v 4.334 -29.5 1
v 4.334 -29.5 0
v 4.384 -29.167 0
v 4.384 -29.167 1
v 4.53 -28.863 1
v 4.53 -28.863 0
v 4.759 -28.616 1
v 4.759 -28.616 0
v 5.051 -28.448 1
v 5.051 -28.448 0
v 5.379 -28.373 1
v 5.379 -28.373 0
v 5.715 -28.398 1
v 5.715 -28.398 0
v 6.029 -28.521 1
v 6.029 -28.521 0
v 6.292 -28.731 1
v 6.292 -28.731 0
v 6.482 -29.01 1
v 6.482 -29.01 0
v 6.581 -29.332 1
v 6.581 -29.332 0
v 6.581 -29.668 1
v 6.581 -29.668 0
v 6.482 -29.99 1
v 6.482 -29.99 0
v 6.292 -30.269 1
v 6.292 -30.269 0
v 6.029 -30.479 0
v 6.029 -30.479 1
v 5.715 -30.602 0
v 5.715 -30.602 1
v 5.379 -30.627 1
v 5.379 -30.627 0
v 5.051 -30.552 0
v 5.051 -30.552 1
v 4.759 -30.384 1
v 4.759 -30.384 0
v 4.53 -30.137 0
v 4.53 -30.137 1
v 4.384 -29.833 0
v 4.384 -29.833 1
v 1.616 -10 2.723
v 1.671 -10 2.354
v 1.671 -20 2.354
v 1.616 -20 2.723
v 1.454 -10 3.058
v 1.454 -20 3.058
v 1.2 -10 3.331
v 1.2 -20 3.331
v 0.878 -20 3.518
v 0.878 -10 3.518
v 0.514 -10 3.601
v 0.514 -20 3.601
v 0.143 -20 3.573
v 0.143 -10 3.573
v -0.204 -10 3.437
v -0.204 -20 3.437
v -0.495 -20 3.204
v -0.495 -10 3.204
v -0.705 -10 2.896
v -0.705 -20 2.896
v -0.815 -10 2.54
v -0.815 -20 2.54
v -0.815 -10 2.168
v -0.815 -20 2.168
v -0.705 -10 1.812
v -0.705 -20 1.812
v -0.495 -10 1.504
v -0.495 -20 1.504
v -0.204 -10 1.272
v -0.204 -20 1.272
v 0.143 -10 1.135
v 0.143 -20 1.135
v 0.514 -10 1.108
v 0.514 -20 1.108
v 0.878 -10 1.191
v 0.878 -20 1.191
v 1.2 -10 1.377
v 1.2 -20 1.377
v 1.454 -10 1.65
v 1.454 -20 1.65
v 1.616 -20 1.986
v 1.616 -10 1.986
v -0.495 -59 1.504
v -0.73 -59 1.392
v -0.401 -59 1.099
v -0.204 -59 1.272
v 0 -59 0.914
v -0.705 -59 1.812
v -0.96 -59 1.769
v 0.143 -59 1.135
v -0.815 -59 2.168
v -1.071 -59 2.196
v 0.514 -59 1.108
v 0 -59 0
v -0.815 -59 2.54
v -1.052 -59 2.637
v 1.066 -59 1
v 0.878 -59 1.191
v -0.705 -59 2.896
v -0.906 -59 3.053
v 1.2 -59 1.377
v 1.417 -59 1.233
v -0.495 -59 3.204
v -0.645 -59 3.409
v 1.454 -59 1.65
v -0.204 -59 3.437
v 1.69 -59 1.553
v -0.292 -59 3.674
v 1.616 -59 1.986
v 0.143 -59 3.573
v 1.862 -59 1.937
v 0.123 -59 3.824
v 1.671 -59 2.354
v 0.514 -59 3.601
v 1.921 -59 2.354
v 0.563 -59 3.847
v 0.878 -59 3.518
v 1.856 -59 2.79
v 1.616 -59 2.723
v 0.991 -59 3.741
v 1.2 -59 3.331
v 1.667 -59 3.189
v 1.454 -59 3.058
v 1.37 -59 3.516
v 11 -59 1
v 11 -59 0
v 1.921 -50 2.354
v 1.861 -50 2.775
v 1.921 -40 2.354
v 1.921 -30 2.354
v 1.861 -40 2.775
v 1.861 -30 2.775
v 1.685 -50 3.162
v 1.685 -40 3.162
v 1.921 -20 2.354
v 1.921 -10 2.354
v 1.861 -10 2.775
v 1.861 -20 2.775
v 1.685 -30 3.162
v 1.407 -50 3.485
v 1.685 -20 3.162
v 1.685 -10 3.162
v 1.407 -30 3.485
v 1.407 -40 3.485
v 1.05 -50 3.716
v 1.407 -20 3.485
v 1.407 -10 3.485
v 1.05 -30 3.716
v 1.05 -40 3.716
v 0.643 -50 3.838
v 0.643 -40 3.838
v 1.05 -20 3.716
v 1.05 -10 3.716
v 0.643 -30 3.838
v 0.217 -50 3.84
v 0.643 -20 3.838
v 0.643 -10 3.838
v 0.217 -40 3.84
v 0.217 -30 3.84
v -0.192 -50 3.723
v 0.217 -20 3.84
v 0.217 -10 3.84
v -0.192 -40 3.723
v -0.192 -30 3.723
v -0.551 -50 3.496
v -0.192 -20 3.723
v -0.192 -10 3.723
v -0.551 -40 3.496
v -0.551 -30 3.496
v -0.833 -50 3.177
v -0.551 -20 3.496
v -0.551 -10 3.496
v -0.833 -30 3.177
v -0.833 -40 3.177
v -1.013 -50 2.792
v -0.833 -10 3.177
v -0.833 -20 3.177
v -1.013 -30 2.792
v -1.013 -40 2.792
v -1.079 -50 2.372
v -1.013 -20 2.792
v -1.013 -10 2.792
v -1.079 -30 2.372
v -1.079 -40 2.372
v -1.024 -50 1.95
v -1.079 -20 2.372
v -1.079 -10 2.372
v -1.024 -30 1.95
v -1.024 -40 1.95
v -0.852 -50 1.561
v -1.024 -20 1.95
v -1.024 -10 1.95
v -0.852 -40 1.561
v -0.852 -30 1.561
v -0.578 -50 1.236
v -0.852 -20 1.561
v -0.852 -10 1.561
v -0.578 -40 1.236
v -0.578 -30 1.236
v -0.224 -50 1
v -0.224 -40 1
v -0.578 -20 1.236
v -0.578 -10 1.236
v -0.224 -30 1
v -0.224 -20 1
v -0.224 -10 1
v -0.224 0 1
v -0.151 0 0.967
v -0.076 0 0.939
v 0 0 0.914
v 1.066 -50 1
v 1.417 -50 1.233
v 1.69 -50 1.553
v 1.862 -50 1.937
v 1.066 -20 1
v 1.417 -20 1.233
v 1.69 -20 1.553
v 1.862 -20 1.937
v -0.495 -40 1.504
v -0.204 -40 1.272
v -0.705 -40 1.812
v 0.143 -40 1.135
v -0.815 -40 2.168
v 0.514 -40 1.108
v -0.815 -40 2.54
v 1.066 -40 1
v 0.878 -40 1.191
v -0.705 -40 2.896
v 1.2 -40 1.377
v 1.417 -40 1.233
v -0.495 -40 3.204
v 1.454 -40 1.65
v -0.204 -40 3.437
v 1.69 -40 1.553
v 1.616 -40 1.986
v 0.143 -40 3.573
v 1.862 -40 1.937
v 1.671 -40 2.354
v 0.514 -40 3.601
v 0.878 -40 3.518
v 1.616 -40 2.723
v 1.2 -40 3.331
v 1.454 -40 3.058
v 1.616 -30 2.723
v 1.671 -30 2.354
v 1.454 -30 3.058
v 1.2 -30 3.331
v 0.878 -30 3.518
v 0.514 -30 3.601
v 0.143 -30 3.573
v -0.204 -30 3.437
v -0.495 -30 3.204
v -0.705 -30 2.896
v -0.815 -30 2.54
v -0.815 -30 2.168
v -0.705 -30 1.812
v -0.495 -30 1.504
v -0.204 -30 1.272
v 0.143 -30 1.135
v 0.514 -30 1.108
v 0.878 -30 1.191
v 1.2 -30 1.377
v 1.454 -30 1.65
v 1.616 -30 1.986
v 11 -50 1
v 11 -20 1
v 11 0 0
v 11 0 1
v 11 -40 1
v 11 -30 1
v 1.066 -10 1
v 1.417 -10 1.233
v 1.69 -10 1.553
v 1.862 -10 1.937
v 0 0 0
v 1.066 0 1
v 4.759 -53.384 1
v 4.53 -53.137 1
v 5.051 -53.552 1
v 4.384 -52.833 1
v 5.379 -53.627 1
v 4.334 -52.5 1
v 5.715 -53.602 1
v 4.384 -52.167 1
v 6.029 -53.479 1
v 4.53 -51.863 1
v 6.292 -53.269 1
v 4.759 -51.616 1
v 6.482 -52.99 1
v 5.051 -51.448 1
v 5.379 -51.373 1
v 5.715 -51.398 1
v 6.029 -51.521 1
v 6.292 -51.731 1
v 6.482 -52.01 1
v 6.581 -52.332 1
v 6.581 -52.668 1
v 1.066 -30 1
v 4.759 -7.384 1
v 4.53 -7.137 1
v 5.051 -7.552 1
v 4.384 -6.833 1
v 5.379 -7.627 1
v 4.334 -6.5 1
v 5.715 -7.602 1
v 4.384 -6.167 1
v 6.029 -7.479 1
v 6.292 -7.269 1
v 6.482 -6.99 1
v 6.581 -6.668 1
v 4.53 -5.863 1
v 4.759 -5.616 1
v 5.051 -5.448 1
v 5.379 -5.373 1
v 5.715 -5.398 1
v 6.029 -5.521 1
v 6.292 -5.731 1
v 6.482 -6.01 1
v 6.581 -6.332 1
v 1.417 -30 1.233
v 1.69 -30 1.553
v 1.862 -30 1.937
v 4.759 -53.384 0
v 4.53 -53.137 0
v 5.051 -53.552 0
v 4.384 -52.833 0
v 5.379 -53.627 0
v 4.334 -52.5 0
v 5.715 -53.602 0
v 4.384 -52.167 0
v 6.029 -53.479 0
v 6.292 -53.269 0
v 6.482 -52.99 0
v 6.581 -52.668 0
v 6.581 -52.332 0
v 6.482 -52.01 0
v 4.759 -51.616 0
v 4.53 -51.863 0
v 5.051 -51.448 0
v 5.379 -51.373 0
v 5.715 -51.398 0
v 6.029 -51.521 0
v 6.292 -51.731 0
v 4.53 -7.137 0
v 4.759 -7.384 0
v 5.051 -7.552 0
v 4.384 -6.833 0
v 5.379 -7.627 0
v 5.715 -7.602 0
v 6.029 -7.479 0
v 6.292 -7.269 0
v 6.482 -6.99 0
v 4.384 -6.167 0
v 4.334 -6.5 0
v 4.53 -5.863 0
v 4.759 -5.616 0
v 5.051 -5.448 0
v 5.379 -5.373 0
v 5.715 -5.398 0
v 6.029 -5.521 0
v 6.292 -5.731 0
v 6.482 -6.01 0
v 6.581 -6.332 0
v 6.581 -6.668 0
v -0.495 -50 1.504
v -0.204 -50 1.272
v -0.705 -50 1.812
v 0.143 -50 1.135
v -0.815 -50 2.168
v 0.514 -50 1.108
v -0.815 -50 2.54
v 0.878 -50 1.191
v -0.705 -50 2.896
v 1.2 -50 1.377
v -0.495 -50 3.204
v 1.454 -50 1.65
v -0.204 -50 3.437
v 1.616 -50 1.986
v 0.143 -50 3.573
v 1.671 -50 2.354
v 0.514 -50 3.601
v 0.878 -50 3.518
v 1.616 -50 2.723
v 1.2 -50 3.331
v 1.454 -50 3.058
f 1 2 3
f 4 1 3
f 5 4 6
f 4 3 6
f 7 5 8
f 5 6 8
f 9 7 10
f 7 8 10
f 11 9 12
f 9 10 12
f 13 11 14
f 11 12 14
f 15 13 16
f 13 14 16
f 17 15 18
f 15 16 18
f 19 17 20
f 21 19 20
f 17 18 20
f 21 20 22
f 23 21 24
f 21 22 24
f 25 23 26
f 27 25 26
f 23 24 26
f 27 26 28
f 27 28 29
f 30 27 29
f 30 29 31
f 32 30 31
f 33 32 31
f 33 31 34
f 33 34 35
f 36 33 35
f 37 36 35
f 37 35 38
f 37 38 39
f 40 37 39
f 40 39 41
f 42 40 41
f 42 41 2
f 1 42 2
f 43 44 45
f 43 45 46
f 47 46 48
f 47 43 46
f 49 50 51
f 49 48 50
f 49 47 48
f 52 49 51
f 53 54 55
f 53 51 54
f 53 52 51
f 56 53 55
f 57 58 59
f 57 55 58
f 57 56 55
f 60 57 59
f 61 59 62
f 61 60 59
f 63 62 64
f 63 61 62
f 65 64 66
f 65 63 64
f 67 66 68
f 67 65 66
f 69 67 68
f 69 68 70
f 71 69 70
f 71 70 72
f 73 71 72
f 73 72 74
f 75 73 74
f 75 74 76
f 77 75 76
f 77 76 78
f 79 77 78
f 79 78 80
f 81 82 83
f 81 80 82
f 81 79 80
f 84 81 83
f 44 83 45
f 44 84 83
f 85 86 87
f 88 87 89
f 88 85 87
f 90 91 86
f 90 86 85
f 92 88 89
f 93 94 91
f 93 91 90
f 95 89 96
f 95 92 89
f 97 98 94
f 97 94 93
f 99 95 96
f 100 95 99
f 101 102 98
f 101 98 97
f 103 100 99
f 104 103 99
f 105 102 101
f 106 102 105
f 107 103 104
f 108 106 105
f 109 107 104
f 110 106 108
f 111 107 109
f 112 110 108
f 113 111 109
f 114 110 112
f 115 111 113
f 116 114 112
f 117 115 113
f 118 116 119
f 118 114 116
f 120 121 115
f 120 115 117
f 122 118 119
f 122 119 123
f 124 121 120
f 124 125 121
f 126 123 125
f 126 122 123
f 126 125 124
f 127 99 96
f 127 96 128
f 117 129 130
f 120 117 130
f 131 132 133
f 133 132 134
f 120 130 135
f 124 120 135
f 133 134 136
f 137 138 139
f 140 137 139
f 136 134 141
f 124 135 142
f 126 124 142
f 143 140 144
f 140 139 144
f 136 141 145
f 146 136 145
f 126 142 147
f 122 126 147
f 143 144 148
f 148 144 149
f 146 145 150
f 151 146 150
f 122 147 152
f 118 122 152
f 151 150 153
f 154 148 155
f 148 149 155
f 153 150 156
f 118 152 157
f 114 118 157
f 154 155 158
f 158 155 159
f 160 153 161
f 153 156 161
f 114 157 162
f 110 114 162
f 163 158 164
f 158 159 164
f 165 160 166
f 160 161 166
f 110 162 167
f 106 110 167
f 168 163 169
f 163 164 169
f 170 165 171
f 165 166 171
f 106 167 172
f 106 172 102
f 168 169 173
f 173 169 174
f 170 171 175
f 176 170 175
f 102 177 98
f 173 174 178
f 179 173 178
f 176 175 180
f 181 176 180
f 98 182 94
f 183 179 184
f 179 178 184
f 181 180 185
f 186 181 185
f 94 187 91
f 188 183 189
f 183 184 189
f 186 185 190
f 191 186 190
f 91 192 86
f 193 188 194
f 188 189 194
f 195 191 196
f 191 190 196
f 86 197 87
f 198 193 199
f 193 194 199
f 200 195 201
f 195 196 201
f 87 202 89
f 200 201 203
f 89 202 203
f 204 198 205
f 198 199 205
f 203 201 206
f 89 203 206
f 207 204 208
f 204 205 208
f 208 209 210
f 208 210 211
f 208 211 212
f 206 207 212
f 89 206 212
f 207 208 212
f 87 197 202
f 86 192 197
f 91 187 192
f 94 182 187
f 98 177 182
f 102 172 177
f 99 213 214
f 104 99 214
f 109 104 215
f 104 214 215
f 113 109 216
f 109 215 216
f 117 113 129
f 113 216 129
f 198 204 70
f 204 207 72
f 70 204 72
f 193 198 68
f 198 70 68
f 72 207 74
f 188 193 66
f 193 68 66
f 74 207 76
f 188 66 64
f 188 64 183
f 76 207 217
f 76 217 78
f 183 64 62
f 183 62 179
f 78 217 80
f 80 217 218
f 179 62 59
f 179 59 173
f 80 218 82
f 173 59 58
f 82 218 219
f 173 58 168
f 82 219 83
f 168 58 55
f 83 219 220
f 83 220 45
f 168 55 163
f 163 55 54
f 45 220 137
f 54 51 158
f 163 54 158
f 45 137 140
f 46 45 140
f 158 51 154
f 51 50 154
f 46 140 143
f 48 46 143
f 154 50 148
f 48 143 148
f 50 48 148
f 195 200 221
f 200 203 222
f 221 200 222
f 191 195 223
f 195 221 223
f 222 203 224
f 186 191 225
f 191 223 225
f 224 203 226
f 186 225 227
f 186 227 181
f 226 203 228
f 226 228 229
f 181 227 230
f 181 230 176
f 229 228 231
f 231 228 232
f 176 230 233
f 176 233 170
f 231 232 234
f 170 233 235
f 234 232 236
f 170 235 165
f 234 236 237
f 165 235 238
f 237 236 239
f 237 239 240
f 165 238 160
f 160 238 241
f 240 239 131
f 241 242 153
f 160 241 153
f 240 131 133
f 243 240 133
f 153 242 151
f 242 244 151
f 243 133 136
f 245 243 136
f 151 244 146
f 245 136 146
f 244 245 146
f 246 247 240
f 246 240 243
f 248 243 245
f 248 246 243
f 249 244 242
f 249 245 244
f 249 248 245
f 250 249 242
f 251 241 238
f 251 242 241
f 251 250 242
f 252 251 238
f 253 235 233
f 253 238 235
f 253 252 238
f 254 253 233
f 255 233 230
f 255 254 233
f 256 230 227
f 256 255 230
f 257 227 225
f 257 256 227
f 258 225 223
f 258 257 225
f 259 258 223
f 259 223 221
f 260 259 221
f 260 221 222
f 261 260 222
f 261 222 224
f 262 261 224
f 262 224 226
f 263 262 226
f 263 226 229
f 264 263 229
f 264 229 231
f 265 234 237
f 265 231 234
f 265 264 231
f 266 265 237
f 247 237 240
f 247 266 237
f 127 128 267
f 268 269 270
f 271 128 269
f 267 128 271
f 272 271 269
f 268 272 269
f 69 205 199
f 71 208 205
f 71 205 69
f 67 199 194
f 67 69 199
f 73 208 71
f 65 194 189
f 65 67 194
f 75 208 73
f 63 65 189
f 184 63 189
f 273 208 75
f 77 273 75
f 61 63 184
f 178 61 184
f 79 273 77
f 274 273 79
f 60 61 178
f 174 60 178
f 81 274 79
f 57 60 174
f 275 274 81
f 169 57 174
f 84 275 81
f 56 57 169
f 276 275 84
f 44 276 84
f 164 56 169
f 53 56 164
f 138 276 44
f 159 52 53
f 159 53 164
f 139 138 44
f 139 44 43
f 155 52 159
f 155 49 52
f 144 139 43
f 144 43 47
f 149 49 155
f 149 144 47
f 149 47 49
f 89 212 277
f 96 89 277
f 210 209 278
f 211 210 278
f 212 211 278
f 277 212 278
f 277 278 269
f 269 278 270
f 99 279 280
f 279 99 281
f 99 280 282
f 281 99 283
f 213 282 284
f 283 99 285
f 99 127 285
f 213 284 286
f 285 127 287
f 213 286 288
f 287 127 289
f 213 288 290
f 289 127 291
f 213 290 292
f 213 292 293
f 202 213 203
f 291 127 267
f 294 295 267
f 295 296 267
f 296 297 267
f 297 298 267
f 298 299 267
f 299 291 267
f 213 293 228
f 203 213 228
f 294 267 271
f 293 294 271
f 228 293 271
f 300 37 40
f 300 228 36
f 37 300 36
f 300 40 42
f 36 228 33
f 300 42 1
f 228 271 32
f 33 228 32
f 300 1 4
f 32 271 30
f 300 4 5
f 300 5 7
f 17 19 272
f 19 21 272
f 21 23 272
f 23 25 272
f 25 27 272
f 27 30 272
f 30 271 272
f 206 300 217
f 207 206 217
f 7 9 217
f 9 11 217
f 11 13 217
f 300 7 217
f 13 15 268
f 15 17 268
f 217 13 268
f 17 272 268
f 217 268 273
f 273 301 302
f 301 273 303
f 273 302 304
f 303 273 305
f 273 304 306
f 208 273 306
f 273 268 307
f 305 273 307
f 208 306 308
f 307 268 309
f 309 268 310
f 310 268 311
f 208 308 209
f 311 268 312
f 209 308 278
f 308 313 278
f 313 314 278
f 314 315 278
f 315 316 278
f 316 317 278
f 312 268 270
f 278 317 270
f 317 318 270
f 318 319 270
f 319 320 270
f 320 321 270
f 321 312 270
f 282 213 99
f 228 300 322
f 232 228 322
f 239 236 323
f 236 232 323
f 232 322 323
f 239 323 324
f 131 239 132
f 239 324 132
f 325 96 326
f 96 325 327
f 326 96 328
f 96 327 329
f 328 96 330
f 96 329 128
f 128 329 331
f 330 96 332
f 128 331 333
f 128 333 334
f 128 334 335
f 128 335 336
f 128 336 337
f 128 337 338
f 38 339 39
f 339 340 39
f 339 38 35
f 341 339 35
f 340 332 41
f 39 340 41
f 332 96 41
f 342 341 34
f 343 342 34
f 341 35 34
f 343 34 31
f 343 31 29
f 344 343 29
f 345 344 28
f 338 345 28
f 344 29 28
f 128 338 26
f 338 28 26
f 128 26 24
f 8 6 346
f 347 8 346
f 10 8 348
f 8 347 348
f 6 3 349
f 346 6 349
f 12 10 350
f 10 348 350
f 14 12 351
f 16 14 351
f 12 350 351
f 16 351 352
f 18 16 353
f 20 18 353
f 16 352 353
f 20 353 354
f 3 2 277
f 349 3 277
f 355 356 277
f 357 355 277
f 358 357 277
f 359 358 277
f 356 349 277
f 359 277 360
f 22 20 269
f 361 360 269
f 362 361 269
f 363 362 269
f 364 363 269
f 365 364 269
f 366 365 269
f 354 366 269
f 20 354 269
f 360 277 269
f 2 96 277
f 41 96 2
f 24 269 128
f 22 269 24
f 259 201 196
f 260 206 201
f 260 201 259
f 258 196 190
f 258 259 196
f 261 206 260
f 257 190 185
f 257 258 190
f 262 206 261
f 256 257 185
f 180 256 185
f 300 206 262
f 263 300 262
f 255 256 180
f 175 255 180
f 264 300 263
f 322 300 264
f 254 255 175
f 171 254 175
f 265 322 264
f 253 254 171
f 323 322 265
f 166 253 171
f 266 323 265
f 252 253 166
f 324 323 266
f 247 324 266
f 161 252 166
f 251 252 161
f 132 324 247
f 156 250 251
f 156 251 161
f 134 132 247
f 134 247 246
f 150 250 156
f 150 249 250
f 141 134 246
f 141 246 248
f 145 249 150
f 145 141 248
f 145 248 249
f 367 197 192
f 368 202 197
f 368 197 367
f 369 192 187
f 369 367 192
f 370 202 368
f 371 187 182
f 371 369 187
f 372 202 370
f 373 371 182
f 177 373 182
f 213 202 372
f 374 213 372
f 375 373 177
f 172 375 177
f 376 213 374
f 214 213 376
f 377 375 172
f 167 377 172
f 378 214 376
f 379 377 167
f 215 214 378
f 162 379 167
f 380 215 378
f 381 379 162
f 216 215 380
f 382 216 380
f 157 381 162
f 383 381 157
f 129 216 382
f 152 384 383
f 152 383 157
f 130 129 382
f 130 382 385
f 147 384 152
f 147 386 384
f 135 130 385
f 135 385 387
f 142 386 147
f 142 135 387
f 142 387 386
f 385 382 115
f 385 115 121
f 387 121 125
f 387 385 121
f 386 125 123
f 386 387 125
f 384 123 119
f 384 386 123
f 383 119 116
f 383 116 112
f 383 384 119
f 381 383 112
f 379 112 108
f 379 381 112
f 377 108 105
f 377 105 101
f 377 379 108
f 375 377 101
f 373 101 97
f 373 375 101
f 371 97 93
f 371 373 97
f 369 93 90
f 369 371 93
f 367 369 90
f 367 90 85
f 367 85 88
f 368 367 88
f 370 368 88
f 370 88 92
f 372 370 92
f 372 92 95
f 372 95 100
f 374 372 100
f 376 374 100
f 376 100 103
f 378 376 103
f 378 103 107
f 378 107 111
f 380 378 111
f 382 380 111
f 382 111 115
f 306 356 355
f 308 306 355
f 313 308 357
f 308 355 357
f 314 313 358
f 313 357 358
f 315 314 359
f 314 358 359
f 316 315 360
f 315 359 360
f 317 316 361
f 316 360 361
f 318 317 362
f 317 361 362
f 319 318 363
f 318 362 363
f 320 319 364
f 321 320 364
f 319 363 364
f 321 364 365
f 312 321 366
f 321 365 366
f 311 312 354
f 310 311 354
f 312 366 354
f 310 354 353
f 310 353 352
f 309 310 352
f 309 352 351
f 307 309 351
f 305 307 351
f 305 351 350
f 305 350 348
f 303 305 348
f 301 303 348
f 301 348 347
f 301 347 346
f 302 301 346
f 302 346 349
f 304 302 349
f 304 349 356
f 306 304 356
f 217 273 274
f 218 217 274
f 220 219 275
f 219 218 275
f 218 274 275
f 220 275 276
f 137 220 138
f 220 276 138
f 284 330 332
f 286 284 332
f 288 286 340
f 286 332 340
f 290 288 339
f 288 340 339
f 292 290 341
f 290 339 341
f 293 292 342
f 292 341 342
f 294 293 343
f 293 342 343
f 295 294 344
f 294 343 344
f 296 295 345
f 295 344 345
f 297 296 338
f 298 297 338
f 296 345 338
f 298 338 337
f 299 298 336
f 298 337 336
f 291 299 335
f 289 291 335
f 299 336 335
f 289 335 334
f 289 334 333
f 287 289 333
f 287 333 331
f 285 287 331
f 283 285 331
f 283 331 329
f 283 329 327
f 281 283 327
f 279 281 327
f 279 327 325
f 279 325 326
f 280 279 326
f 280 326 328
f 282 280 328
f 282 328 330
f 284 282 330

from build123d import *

# Parameters (mm, degrees)
F0_R     = 1.25
F1_DEPTH = 59
F2_W     = 10
F2_H     = 7.0094654113
F2_H_2   = 7.1141358241
F3_DEPTH = 12.0799340399
F5_D     = 2.2606


with BuildPart() as f1:
    # F0 (on Front) → F1 (new body)
    with BuildSketch(Plane.XZ):
        with BuildLine():
            Line((0, 0.9144042292), (0, 0))
            Line((0, 0), (11, 0))
            Line((11, 0), (11, 1))
            Line((11, 1), (1.0663817193, 1))
            ThreePointArc((1.0663817193, 1), (0.5410811762, 0.8589018219), (0, 0.9144042292))
        make_face()
        with BuildLine():
            Line((0, 1), (0, 0.9144042292))
            ThreePointArc((0, 0.9144042292), (0.5410811762, 0.8589018219), (1.0663817193, 1))
            Line((1.0663817193, 1), (0, 1))
        make_face()
        with BuildLine():
            ThreePointArc((1.9210659601, 2.354092896), (-0.4784897802, 3.5544259623), (0, 0.9144042292))
            Line((0, 0.9144042292), (0, 1))
            Line((0, 1), (1.0663817193, 1))
            ThreePointArc((1.0663817193, 1), (1.6895244022, 1.5534599085), (1.9210659601, 2.354092896))
        make_face()
        with Locations((0.4210659601, 2.354092896)):
            Circle(F0_R, mode=Mode.SUBTRACT)
    extrude(amount=F1_DEPTH)

    # F2 (on face) → F3 (cut, through all)
    with BuildSketch(Plane.YZ.offset(11)):
        with Locations((-45, 4.5047327057)):
            Rectangle(F2_W, F2_H)
        with Locations((-25, 4.5570679121)):
            Rectangle(F2_W, F2_H_2)
        with Locations((-5, 4.5570679121)):
            Rectangle(F2_W, F2_H_2)
    extrude(amount=-F3_DEPTH, mode=Mode.SUBTRACT)

    # F5 (through all)
    with Locations(Plane.XY.offset(1)):
        with Locations((5.463800393, -6.5), (5.463800393, -29.5), (5.463800393, -52.5)):
            Hole(F5_D / 2)


solid = f1.part
